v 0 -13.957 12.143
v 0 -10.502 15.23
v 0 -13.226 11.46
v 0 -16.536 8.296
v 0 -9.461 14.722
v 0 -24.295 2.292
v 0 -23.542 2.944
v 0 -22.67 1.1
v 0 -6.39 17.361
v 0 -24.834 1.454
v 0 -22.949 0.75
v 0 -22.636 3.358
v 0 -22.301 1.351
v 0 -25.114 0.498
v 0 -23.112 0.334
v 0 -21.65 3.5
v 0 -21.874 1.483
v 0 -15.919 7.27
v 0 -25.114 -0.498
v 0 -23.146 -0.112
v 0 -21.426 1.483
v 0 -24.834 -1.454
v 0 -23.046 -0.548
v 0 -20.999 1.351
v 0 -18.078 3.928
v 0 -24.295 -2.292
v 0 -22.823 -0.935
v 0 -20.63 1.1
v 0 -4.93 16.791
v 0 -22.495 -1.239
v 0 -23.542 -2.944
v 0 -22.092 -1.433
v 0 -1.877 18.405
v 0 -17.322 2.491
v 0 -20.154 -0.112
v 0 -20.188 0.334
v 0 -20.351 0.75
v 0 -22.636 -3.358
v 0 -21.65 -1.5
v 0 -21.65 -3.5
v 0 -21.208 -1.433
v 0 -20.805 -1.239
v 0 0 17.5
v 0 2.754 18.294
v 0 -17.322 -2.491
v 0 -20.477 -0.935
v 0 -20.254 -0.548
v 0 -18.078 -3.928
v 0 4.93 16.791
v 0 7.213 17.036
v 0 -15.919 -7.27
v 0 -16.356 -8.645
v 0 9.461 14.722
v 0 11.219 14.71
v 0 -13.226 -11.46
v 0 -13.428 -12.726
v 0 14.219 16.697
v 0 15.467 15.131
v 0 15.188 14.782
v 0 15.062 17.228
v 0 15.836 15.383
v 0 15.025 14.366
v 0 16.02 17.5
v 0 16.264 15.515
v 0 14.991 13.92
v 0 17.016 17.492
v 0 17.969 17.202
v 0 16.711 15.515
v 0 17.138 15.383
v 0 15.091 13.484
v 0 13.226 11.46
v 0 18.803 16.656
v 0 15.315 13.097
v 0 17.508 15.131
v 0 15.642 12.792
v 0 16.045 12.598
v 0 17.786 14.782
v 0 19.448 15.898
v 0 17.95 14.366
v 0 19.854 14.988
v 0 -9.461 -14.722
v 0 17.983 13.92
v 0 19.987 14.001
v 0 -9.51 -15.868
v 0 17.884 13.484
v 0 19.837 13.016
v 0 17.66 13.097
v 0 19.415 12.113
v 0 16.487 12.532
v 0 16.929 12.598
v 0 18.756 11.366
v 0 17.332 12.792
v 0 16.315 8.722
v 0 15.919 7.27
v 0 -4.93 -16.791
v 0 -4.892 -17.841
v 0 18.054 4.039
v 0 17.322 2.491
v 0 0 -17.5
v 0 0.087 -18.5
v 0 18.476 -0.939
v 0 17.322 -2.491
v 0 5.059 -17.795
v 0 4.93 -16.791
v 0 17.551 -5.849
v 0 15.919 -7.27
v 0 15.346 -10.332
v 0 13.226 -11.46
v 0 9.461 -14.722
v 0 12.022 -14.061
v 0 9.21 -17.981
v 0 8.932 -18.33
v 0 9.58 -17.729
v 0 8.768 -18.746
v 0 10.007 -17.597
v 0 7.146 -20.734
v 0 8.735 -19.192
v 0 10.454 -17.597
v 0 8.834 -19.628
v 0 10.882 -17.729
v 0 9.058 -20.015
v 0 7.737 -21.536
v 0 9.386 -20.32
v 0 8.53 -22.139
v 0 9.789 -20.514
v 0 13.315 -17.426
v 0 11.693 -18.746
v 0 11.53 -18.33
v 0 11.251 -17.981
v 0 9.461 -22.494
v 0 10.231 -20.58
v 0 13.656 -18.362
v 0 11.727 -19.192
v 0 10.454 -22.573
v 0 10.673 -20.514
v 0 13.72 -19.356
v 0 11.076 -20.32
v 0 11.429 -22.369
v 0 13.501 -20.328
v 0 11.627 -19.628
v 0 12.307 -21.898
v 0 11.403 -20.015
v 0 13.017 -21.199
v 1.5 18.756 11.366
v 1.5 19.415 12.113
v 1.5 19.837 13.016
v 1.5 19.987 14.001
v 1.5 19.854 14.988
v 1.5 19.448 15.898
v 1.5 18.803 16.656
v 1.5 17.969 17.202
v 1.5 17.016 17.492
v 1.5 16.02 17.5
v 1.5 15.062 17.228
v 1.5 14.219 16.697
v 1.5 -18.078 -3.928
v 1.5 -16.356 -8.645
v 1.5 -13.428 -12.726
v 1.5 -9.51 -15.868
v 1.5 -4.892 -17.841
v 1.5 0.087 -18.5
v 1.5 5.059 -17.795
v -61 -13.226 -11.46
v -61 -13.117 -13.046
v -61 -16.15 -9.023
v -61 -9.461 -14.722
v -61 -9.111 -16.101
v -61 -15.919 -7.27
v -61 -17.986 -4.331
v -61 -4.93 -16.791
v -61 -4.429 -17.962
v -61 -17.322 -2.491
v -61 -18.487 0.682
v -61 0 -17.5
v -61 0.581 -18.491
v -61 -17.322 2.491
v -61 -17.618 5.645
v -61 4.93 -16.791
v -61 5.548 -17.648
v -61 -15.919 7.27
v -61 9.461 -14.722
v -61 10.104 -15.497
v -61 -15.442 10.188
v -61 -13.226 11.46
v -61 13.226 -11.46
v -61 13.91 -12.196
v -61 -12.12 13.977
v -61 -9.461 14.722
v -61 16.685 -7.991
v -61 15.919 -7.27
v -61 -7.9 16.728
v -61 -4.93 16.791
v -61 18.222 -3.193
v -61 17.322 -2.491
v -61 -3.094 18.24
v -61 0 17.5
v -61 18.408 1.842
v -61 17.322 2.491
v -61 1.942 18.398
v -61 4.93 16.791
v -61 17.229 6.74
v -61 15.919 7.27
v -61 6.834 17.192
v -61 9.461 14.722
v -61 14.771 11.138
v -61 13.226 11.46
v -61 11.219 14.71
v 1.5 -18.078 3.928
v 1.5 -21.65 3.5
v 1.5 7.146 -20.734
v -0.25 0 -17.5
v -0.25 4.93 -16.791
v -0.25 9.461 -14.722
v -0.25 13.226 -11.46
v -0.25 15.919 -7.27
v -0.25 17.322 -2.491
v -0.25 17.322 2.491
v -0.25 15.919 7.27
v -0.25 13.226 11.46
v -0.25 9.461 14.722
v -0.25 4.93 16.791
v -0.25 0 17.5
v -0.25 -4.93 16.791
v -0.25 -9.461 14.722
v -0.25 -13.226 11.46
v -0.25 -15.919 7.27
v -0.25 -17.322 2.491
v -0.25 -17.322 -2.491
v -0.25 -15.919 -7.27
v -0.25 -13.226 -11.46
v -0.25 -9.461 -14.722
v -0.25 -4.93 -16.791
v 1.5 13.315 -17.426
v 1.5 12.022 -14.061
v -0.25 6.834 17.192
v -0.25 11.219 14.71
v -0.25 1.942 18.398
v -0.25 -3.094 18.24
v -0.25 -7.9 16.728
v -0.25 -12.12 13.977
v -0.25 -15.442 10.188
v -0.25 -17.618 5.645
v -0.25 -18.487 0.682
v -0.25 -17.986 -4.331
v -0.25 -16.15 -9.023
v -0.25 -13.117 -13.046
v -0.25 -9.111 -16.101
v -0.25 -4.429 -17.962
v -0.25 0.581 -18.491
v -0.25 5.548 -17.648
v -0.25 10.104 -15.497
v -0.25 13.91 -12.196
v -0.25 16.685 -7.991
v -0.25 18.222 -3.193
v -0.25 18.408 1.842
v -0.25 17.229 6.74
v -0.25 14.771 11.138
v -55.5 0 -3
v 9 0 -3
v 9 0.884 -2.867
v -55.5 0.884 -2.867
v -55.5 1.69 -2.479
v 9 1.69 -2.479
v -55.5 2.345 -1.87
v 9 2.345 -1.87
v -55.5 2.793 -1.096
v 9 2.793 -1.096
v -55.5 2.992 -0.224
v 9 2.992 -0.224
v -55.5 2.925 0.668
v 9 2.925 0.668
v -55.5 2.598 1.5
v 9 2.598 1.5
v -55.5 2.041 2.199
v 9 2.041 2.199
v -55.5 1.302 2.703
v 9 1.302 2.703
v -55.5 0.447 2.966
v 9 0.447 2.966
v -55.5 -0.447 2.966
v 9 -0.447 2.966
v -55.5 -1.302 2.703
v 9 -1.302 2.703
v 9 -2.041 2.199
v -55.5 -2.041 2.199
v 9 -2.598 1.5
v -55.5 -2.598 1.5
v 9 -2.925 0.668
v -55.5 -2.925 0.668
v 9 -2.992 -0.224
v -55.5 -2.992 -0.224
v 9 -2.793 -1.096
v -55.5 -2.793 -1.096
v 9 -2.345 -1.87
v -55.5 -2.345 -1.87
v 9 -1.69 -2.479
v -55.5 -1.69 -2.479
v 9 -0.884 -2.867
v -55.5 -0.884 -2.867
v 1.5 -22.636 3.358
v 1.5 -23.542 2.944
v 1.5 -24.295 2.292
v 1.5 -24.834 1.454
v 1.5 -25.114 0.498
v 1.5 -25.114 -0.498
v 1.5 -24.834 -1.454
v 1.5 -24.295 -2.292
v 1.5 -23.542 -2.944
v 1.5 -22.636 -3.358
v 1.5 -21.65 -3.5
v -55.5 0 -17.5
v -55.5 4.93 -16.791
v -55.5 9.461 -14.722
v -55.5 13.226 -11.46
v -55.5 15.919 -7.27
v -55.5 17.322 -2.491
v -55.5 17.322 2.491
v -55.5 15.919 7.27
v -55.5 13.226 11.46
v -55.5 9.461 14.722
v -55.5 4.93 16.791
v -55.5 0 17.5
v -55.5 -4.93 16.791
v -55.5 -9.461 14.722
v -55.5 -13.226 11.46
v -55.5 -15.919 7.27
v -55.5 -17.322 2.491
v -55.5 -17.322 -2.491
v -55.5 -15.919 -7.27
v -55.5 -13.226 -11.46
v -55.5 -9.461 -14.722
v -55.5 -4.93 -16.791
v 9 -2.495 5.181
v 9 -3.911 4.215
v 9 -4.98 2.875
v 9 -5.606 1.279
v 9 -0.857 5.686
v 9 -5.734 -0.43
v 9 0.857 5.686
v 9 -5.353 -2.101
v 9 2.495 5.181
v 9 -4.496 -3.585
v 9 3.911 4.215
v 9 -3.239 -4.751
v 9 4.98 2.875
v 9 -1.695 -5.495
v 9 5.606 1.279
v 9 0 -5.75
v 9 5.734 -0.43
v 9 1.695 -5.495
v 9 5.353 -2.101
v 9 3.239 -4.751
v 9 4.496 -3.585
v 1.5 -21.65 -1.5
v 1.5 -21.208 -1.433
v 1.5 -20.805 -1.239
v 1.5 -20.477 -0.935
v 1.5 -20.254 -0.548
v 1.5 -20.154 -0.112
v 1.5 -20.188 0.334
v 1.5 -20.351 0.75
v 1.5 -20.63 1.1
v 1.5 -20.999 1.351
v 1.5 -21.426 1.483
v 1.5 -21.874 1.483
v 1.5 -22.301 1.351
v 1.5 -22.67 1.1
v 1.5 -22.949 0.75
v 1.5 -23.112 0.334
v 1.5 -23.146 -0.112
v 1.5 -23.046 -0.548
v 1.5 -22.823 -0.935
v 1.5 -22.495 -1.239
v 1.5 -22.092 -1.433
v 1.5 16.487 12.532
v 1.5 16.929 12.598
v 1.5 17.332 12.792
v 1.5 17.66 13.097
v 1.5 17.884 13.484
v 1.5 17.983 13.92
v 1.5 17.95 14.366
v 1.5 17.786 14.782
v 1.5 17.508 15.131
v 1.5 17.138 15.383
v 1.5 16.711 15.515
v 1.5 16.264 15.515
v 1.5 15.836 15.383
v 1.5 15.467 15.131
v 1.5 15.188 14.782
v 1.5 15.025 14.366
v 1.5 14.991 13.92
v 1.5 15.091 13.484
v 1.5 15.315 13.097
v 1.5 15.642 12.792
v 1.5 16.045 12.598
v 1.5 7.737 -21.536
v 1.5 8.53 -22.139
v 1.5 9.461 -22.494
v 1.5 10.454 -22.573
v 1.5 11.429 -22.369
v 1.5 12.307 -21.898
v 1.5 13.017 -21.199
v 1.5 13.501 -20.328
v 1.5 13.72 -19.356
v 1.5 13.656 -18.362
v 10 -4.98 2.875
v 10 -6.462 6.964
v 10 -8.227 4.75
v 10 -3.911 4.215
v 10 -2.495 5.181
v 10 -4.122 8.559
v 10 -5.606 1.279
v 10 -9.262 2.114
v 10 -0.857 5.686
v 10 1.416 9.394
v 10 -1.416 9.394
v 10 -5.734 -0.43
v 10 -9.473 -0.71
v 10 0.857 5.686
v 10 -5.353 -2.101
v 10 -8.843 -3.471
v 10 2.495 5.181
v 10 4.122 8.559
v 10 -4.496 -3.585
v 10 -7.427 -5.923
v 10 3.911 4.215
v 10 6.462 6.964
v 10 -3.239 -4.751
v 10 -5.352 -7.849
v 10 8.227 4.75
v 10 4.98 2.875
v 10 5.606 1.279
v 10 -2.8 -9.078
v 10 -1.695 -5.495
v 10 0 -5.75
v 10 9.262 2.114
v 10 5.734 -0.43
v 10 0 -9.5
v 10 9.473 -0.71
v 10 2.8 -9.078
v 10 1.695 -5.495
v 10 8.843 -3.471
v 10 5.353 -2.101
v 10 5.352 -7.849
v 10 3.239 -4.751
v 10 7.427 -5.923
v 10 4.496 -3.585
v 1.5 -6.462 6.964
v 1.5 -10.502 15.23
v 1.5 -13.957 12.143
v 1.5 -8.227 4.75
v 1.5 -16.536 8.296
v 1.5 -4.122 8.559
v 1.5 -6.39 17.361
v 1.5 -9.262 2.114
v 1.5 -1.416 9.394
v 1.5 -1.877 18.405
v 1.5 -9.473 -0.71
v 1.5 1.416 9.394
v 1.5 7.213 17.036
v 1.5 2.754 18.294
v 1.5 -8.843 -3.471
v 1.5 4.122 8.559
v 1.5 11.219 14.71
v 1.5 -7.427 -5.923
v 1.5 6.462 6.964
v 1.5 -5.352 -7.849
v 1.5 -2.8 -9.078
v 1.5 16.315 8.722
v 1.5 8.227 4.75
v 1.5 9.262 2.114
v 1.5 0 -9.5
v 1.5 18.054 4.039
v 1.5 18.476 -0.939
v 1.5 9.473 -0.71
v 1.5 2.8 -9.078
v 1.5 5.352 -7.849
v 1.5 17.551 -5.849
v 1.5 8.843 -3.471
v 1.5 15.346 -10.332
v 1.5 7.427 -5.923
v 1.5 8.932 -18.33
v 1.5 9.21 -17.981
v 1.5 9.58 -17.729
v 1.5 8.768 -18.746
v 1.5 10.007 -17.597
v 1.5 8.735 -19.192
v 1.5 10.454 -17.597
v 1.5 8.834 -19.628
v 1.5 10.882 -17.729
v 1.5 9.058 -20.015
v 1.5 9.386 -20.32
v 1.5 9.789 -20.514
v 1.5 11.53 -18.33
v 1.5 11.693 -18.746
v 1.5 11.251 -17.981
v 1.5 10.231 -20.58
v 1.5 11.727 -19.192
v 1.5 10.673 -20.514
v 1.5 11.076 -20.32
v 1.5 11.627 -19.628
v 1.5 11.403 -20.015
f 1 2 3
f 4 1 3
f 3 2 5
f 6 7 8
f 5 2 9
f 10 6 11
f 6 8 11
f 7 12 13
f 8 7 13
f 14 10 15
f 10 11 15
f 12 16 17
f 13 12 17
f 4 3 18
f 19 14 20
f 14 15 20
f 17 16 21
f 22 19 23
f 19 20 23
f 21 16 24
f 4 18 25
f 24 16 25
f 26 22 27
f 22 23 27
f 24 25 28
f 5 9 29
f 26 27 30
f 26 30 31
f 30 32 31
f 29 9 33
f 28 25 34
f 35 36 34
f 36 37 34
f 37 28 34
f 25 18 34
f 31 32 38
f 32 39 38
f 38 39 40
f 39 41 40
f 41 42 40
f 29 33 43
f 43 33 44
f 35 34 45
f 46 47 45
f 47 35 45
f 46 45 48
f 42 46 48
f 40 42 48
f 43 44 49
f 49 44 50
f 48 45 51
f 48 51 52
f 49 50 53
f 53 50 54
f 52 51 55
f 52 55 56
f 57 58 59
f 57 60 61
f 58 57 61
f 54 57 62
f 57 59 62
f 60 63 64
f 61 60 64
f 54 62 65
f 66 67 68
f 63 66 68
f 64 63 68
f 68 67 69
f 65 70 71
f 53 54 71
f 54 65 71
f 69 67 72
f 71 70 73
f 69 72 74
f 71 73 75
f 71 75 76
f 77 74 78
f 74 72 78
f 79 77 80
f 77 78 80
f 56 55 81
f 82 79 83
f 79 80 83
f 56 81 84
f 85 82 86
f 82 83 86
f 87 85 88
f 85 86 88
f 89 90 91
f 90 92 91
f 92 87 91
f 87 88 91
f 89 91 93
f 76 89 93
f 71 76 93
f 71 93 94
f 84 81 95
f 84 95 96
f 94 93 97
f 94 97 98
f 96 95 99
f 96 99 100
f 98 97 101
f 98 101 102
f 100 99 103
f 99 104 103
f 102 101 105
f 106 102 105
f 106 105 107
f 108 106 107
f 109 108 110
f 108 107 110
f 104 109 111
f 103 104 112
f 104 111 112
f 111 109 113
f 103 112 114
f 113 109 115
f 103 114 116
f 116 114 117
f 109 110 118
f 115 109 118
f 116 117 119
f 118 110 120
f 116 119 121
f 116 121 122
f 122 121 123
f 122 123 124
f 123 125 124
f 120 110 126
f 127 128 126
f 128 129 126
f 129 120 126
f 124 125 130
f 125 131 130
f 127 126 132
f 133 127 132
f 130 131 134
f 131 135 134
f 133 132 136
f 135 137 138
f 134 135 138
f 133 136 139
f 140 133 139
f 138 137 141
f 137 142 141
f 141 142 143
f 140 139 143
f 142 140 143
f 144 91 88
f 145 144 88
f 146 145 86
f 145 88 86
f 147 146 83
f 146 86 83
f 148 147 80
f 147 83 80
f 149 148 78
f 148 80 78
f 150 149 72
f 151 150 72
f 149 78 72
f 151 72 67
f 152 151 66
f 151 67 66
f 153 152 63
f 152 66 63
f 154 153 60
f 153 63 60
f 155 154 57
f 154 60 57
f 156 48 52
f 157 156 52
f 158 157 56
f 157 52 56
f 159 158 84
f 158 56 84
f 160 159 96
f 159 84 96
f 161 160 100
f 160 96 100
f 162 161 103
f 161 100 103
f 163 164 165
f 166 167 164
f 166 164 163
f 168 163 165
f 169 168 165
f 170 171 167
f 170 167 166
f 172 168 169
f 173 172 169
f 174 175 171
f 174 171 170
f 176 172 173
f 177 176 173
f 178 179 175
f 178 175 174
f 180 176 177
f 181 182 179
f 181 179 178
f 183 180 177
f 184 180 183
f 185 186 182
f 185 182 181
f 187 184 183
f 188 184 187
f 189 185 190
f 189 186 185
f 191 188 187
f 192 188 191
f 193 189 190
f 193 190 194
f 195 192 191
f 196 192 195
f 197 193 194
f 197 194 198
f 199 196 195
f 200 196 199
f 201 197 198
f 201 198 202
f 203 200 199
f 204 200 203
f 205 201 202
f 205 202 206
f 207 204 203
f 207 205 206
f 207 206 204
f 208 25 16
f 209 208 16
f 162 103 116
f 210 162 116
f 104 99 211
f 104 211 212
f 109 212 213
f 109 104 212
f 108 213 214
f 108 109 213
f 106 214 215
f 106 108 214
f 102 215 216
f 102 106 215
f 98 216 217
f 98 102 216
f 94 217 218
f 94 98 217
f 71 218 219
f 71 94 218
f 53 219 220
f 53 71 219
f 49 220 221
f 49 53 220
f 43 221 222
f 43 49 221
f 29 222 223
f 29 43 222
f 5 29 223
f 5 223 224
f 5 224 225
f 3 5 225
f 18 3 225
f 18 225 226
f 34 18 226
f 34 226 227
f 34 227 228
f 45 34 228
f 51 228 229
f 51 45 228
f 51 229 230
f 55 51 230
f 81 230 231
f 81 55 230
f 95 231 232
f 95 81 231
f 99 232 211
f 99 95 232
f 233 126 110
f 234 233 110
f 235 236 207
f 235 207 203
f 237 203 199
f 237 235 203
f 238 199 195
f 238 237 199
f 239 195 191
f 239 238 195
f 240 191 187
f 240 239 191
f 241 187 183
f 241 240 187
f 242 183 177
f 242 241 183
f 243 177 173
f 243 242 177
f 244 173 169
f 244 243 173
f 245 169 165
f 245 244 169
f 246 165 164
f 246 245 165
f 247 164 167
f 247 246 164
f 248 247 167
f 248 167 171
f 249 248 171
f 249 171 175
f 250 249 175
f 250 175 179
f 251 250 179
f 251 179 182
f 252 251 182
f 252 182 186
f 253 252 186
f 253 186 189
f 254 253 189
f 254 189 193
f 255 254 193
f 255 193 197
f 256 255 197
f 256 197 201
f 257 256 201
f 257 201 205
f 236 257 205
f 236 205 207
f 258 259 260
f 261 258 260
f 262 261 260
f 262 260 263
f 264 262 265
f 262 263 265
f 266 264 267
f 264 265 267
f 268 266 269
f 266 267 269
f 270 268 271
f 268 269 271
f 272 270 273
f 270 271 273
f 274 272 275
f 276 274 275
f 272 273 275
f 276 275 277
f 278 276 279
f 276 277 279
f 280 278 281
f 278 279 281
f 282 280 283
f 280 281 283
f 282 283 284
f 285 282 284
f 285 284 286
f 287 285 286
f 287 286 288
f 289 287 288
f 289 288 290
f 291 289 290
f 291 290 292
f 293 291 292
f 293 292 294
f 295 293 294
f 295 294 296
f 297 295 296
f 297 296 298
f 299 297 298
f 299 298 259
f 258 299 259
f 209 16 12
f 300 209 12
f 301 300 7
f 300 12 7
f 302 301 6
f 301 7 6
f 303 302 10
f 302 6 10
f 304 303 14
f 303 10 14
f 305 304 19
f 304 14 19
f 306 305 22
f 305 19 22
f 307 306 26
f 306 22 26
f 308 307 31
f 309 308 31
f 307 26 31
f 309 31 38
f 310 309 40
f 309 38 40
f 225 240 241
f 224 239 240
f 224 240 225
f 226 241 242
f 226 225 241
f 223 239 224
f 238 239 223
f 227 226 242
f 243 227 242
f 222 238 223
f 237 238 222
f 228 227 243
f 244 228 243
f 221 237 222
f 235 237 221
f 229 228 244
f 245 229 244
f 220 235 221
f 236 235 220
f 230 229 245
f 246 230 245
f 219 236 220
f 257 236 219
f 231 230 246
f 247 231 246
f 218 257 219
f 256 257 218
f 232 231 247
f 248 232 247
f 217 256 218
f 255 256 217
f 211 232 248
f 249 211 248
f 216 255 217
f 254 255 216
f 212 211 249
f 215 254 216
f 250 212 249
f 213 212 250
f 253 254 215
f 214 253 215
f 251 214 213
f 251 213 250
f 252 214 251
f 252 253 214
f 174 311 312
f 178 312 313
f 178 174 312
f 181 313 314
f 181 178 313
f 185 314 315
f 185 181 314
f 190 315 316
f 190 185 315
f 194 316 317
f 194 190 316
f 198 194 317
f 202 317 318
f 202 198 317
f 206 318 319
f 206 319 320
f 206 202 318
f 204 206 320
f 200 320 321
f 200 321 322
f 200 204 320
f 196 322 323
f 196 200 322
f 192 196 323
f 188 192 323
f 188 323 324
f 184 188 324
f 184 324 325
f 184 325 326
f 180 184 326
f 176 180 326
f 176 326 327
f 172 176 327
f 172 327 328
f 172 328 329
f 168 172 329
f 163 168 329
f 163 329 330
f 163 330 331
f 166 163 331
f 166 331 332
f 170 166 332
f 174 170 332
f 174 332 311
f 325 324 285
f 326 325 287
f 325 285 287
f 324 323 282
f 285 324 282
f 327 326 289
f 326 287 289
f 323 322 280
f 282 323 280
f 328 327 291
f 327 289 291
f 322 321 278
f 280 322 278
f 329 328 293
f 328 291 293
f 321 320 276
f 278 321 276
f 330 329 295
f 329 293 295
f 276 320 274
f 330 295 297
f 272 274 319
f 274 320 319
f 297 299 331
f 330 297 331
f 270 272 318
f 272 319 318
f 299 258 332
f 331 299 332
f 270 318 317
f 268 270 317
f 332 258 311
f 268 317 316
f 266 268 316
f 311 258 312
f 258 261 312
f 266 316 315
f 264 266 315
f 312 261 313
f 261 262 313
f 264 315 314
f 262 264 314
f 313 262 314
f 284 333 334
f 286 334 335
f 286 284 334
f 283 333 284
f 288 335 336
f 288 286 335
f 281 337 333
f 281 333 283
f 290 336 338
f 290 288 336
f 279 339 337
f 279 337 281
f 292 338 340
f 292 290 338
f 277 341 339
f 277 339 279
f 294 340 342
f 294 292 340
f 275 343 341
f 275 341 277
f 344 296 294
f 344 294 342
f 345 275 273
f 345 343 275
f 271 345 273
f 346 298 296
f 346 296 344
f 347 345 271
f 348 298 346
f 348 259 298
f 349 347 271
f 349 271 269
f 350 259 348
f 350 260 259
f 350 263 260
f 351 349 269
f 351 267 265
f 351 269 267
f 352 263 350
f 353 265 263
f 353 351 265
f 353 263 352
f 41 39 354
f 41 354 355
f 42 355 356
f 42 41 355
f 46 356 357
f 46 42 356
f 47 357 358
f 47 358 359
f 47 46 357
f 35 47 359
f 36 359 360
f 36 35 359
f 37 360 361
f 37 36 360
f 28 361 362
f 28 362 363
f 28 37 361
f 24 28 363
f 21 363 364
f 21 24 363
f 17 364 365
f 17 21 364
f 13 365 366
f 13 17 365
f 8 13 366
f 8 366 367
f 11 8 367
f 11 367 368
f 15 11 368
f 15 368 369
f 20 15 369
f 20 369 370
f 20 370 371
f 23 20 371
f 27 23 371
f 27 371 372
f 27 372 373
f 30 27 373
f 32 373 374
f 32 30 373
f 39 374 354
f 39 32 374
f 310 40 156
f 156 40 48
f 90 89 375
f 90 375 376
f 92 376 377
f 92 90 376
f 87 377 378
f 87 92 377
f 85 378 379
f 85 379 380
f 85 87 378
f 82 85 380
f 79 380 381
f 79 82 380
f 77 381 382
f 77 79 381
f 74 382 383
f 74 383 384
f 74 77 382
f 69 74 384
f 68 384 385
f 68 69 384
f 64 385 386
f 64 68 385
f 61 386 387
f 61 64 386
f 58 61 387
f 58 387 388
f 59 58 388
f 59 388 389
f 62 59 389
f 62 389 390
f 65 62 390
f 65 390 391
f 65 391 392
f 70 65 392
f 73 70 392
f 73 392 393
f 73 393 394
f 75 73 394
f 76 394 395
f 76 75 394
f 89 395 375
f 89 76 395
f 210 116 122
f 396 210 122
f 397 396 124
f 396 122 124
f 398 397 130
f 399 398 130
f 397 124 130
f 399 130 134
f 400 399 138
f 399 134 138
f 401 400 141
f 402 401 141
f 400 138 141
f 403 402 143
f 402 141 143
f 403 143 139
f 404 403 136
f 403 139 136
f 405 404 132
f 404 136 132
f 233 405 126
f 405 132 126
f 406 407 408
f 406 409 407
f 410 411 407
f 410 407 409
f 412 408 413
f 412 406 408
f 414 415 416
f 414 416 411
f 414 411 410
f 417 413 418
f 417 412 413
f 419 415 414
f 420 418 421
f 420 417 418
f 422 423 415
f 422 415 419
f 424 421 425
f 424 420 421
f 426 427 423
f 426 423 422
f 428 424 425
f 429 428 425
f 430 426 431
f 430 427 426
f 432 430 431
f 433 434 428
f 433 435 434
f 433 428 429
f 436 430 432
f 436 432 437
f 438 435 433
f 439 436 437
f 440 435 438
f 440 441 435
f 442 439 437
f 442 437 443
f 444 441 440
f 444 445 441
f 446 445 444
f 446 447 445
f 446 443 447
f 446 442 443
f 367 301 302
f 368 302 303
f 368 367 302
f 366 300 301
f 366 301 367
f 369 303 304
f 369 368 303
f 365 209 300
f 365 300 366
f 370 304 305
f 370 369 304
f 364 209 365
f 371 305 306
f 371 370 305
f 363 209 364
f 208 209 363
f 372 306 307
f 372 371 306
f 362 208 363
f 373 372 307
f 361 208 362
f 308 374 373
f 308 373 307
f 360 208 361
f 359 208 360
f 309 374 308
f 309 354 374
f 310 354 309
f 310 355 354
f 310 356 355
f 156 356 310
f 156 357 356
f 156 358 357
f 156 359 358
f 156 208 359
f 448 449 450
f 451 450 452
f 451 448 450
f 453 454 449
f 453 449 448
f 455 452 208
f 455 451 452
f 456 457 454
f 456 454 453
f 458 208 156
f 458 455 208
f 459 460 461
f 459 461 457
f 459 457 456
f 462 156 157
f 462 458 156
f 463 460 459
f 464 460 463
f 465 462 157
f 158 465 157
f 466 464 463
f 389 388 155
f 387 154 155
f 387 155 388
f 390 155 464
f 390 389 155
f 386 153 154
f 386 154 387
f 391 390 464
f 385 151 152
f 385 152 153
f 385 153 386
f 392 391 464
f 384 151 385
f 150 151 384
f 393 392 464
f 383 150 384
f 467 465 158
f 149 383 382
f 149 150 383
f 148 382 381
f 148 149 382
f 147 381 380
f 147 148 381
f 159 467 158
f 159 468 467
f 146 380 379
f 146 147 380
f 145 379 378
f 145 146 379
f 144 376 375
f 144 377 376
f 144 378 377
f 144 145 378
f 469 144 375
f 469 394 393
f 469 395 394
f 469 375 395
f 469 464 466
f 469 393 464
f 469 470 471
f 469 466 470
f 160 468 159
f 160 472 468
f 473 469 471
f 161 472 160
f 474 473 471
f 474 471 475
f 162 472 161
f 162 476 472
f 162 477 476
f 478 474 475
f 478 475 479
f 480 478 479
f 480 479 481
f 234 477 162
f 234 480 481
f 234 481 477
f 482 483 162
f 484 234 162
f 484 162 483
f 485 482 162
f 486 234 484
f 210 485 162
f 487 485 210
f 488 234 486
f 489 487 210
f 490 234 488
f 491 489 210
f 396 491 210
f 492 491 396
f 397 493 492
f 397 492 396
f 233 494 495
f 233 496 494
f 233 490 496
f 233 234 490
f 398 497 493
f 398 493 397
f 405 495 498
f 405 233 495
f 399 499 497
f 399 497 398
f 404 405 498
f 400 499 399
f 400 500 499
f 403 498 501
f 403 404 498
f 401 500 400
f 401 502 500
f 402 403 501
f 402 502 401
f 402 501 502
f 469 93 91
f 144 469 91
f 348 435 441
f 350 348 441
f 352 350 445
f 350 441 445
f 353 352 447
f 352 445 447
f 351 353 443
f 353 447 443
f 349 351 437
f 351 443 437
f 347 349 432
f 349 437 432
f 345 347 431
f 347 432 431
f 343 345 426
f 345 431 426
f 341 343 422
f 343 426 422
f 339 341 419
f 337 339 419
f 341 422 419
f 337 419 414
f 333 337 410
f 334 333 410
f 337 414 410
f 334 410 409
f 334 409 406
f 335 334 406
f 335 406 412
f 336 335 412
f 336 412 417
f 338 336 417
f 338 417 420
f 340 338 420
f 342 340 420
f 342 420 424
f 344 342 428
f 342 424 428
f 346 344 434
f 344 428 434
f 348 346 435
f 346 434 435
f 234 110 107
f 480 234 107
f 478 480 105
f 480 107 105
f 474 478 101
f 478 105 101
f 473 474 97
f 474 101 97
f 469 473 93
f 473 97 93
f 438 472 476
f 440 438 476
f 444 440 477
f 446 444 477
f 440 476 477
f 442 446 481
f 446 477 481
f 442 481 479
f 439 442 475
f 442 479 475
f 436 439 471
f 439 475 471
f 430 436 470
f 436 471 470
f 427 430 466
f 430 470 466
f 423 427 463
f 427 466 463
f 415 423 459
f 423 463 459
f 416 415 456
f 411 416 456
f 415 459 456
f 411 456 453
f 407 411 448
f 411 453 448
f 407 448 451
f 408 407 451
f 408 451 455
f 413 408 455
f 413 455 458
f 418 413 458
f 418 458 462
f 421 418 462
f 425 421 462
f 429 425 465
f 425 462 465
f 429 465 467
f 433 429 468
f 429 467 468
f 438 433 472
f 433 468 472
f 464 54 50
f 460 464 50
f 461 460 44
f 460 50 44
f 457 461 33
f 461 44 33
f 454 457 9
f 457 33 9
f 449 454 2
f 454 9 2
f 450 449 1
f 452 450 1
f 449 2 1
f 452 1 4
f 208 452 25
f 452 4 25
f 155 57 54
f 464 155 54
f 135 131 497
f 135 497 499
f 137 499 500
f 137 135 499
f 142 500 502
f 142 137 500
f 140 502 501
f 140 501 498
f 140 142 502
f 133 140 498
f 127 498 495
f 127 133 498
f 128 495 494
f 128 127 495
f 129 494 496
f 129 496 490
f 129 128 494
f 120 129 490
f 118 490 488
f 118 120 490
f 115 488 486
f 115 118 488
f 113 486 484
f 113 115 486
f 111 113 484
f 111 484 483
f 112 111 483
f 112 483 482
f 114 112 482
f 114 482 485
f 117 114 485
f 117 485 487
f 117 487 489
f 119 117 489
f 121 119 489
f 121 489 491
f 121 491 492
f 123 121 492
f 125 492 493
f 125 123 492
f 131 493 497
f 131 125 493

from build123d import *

# Parameters (mm, degrees)
SKETCH1_R               = 1.5
SKETCH1_R_2             = 18.5
SKETCH1_R_3             = 17.5
BOSS_EXTRUDE1_DEPTH     = 1.5
SKETCH1_4_R             = 18.5
SKETCH1_4_R_2           = 17.5
BOSS_EXTRUDE2_DEPTH     = 61.5
CUT_EXTRUDE1_START      = -61.5
SKETCH1_5_R             = 17.5
CUT_EXTRUDE1_DEPTH      = 6
SKETCH2_R               = 9.5
SKETCH2_R_2             = 5.75
BOSS_EXTRUDE3_DEPTH     = 8.5
SKETCH3_R               = 5.75
CUT_EXTRUDE2_DEPTH      = 1
SKETCH4_R               = 3
CUT_EXTRUDE3_DEPTH      = 79.183366667
CUT_EXTRUDE3_DEPTH_BACK = 79.183366667
CUT_EXTRUDE4_START      = -1.5
SKETCH5_R               = 18.5
SKETCH5_R_2             = 17.5
CUT_EXTRUDE4_DEPTH      = 0.25
SKETCH6_R               = 18.5
CUT_EXTRUDE5_DEPTH      = 0.5


with BuildPart() as part:
    # Sketch1 → Boss-Extrude1 (new body)
    with BuildSketch(Plane(origin=(0, 0, 0), x_dir=(0, 0, -1), z_dir=(1, 0, 0))):
        with BuildLine():
            ThreePointArc((-11.366411782, 18.755724012), (-16.300215512, 19.152688435), (-16.697179934, 14.218884704))
            Line((-16.697179934, 14.218884704), (-14.710366227, 11.218517079))
            ThreePointArc((-14.710366227, 11.218517079), (-11.99021817, 14.088458689), (-8.722294226, 16.31476581))
            Line((-8.722294226, 16.31476581), (-11.366411782, 18.755724012))
        make_face()
        with Locations((-14.031795858, 16.487304358)):
            Circle(SKETCH1_R, mode=Mode.SUBTRACT)
        Circle(SKETCH1_R_2)
        Circle(SKETCH1_R_3, mode=Mode.SUBTRACT)
        Circle(SKETCH1_R_3)
        with BuildLine():
            Line((17.42629206, 13.315286142), (14.061297684, 12.022059201))
            ThreePointArc((14.061297684, 12.022059201), (16.304113863, 8.74218915), (17.794831776, 5.059047546))
            Line((17.794831776, 5.059047546), (20.734147414, 7.146161977))
            ThreePointArc((20.734147414, 7.146161977), (22.164781819, 11.884651736), (17.42629206, 13.315286142))
        make_face()
        with Locations((19.080219737, 10.230724059)):
            Circle(SKETCH1_R, mode=Mode.SUBTRACT)
        with BuildLine():
            ThreePointArc((3.927811116, -18.078227232), (0, -18.5), (-3.927811116, -18.078227232))
            Line((-3.927811116, -18.078227232), (-3.5, -21.65))
            ThreePointArc((-3.5, -21.65), (0, -25.15), (3.5, -21.65))
            Line((3.5, -21.65), (3.927811116, -18.078227232))
        make_face()
        with Locations((0, -21.65)):
            Circle(SKETCH1_R, mode=Mode.SUBTRACT)
    extrude(amount=BOSS_EXTRUDE1_DEPTH)

    # Sketch1<4> → Boss-Extrude2 (add)
    with BuildSketch(Plane(origin=(0, 0, 0), x_dir=(0, 0, -1), z_dir=(1, 0, 0))):
        with Locations(Location((0, 0, 0), (0, 0, 142.669891736))):
            Circle(SKETCH1_4_R)
        Circle(SKETCH1_4_R_2, mode=Mode.SUBTRACT)
        Circle(SKETCH1_4_R_2)
    extrude(amount=-BOSS_EXTRUDE2_DEPTH)

    # Sketch1<5> → Cut-Extrude1 (cut)
    with BuildSketch(Plane(origin=(0, 0, 0), x_dir=(0, 0, -1), z_dir=(1, 0, 0)).offset(CUT_EXTRUDE1_START)):
        Circle(SKETCH1_5_R)
    extrude(amount=CUT_EXTRUDE1_DEPTH, mode=Mode.SUBTRACT)

    # Sketch2 → Boss-Extrude3 (add)
    with BuildSketch(Plane(origin=(1.5, 0, 0), x_dir=(0, 0, -1), z_dir=(1, 0, 0))):
        Circle(SKETCH2_R)
        Circle(SKETCH2_R_2, mode=Mode.SUBTRACT)
        Circle(SKETCH2_R_2)
    extrude(amount=BOSS_EXTRUDE3_DEPTH)

    # Sketch3 → Cut-Extrude2 (cut)
    with BuildSketch(Plane(origin=(10, 0, 0), x_dir=(0, 0, -1), z_dir=(1, 0, 0))):
        Circle(SKETCH3_R)
    extrude(amount=-CUT_EXTRUDE2_DEPTH, mode=Mode.SUBTRACT)

    # Sketch4 → Cut-Extrude3 (cut, two sides)
    with BuildSketch(Plane(origin=(9, 0, 0), x_dir=(0, 0, -1), z_dir=(1, 0, 0))) as cut_extrude3_sk:
        Circle(SKETCH4_R)
    extrude(amount=CUT_EXTRUDE3_DEPTH, mode=Mode.SUBTRACT)
    extrude(cut_extrude3_sk.sketch, amount=-CUT_EXTRUDE3_DEPTH_BACK, mode=Mode.SUBTRACT)

    # Sketch5 → Cut-Extrude4 (cut)
    with BuildSketch(Plane(origin=(1.5, 0, 0), x_dir=(0, 0, -1), z_dir=(1, 0, 0)).offset(CUT_EXTRUDE4_START)):
        Circle(SKETCH5_R)
        Circle(SKETCH5_R_2, mode=Mode.SUBTRACT)
    extrude(amount=-CUT_EXTRUDE4_DEPTH, mode=Mode.SUBTRACT)

    # Sketch6 → Cut-Extrude5 (cut)
    with BuildSketch(Plane.ZY.offset(61.5)):
        Circle(SKETCH6_R)
    extrude(amount=-CUT_EXTRUDE5_DEPTH, mode=Mode.SUBTRACT)


solid = part.part
